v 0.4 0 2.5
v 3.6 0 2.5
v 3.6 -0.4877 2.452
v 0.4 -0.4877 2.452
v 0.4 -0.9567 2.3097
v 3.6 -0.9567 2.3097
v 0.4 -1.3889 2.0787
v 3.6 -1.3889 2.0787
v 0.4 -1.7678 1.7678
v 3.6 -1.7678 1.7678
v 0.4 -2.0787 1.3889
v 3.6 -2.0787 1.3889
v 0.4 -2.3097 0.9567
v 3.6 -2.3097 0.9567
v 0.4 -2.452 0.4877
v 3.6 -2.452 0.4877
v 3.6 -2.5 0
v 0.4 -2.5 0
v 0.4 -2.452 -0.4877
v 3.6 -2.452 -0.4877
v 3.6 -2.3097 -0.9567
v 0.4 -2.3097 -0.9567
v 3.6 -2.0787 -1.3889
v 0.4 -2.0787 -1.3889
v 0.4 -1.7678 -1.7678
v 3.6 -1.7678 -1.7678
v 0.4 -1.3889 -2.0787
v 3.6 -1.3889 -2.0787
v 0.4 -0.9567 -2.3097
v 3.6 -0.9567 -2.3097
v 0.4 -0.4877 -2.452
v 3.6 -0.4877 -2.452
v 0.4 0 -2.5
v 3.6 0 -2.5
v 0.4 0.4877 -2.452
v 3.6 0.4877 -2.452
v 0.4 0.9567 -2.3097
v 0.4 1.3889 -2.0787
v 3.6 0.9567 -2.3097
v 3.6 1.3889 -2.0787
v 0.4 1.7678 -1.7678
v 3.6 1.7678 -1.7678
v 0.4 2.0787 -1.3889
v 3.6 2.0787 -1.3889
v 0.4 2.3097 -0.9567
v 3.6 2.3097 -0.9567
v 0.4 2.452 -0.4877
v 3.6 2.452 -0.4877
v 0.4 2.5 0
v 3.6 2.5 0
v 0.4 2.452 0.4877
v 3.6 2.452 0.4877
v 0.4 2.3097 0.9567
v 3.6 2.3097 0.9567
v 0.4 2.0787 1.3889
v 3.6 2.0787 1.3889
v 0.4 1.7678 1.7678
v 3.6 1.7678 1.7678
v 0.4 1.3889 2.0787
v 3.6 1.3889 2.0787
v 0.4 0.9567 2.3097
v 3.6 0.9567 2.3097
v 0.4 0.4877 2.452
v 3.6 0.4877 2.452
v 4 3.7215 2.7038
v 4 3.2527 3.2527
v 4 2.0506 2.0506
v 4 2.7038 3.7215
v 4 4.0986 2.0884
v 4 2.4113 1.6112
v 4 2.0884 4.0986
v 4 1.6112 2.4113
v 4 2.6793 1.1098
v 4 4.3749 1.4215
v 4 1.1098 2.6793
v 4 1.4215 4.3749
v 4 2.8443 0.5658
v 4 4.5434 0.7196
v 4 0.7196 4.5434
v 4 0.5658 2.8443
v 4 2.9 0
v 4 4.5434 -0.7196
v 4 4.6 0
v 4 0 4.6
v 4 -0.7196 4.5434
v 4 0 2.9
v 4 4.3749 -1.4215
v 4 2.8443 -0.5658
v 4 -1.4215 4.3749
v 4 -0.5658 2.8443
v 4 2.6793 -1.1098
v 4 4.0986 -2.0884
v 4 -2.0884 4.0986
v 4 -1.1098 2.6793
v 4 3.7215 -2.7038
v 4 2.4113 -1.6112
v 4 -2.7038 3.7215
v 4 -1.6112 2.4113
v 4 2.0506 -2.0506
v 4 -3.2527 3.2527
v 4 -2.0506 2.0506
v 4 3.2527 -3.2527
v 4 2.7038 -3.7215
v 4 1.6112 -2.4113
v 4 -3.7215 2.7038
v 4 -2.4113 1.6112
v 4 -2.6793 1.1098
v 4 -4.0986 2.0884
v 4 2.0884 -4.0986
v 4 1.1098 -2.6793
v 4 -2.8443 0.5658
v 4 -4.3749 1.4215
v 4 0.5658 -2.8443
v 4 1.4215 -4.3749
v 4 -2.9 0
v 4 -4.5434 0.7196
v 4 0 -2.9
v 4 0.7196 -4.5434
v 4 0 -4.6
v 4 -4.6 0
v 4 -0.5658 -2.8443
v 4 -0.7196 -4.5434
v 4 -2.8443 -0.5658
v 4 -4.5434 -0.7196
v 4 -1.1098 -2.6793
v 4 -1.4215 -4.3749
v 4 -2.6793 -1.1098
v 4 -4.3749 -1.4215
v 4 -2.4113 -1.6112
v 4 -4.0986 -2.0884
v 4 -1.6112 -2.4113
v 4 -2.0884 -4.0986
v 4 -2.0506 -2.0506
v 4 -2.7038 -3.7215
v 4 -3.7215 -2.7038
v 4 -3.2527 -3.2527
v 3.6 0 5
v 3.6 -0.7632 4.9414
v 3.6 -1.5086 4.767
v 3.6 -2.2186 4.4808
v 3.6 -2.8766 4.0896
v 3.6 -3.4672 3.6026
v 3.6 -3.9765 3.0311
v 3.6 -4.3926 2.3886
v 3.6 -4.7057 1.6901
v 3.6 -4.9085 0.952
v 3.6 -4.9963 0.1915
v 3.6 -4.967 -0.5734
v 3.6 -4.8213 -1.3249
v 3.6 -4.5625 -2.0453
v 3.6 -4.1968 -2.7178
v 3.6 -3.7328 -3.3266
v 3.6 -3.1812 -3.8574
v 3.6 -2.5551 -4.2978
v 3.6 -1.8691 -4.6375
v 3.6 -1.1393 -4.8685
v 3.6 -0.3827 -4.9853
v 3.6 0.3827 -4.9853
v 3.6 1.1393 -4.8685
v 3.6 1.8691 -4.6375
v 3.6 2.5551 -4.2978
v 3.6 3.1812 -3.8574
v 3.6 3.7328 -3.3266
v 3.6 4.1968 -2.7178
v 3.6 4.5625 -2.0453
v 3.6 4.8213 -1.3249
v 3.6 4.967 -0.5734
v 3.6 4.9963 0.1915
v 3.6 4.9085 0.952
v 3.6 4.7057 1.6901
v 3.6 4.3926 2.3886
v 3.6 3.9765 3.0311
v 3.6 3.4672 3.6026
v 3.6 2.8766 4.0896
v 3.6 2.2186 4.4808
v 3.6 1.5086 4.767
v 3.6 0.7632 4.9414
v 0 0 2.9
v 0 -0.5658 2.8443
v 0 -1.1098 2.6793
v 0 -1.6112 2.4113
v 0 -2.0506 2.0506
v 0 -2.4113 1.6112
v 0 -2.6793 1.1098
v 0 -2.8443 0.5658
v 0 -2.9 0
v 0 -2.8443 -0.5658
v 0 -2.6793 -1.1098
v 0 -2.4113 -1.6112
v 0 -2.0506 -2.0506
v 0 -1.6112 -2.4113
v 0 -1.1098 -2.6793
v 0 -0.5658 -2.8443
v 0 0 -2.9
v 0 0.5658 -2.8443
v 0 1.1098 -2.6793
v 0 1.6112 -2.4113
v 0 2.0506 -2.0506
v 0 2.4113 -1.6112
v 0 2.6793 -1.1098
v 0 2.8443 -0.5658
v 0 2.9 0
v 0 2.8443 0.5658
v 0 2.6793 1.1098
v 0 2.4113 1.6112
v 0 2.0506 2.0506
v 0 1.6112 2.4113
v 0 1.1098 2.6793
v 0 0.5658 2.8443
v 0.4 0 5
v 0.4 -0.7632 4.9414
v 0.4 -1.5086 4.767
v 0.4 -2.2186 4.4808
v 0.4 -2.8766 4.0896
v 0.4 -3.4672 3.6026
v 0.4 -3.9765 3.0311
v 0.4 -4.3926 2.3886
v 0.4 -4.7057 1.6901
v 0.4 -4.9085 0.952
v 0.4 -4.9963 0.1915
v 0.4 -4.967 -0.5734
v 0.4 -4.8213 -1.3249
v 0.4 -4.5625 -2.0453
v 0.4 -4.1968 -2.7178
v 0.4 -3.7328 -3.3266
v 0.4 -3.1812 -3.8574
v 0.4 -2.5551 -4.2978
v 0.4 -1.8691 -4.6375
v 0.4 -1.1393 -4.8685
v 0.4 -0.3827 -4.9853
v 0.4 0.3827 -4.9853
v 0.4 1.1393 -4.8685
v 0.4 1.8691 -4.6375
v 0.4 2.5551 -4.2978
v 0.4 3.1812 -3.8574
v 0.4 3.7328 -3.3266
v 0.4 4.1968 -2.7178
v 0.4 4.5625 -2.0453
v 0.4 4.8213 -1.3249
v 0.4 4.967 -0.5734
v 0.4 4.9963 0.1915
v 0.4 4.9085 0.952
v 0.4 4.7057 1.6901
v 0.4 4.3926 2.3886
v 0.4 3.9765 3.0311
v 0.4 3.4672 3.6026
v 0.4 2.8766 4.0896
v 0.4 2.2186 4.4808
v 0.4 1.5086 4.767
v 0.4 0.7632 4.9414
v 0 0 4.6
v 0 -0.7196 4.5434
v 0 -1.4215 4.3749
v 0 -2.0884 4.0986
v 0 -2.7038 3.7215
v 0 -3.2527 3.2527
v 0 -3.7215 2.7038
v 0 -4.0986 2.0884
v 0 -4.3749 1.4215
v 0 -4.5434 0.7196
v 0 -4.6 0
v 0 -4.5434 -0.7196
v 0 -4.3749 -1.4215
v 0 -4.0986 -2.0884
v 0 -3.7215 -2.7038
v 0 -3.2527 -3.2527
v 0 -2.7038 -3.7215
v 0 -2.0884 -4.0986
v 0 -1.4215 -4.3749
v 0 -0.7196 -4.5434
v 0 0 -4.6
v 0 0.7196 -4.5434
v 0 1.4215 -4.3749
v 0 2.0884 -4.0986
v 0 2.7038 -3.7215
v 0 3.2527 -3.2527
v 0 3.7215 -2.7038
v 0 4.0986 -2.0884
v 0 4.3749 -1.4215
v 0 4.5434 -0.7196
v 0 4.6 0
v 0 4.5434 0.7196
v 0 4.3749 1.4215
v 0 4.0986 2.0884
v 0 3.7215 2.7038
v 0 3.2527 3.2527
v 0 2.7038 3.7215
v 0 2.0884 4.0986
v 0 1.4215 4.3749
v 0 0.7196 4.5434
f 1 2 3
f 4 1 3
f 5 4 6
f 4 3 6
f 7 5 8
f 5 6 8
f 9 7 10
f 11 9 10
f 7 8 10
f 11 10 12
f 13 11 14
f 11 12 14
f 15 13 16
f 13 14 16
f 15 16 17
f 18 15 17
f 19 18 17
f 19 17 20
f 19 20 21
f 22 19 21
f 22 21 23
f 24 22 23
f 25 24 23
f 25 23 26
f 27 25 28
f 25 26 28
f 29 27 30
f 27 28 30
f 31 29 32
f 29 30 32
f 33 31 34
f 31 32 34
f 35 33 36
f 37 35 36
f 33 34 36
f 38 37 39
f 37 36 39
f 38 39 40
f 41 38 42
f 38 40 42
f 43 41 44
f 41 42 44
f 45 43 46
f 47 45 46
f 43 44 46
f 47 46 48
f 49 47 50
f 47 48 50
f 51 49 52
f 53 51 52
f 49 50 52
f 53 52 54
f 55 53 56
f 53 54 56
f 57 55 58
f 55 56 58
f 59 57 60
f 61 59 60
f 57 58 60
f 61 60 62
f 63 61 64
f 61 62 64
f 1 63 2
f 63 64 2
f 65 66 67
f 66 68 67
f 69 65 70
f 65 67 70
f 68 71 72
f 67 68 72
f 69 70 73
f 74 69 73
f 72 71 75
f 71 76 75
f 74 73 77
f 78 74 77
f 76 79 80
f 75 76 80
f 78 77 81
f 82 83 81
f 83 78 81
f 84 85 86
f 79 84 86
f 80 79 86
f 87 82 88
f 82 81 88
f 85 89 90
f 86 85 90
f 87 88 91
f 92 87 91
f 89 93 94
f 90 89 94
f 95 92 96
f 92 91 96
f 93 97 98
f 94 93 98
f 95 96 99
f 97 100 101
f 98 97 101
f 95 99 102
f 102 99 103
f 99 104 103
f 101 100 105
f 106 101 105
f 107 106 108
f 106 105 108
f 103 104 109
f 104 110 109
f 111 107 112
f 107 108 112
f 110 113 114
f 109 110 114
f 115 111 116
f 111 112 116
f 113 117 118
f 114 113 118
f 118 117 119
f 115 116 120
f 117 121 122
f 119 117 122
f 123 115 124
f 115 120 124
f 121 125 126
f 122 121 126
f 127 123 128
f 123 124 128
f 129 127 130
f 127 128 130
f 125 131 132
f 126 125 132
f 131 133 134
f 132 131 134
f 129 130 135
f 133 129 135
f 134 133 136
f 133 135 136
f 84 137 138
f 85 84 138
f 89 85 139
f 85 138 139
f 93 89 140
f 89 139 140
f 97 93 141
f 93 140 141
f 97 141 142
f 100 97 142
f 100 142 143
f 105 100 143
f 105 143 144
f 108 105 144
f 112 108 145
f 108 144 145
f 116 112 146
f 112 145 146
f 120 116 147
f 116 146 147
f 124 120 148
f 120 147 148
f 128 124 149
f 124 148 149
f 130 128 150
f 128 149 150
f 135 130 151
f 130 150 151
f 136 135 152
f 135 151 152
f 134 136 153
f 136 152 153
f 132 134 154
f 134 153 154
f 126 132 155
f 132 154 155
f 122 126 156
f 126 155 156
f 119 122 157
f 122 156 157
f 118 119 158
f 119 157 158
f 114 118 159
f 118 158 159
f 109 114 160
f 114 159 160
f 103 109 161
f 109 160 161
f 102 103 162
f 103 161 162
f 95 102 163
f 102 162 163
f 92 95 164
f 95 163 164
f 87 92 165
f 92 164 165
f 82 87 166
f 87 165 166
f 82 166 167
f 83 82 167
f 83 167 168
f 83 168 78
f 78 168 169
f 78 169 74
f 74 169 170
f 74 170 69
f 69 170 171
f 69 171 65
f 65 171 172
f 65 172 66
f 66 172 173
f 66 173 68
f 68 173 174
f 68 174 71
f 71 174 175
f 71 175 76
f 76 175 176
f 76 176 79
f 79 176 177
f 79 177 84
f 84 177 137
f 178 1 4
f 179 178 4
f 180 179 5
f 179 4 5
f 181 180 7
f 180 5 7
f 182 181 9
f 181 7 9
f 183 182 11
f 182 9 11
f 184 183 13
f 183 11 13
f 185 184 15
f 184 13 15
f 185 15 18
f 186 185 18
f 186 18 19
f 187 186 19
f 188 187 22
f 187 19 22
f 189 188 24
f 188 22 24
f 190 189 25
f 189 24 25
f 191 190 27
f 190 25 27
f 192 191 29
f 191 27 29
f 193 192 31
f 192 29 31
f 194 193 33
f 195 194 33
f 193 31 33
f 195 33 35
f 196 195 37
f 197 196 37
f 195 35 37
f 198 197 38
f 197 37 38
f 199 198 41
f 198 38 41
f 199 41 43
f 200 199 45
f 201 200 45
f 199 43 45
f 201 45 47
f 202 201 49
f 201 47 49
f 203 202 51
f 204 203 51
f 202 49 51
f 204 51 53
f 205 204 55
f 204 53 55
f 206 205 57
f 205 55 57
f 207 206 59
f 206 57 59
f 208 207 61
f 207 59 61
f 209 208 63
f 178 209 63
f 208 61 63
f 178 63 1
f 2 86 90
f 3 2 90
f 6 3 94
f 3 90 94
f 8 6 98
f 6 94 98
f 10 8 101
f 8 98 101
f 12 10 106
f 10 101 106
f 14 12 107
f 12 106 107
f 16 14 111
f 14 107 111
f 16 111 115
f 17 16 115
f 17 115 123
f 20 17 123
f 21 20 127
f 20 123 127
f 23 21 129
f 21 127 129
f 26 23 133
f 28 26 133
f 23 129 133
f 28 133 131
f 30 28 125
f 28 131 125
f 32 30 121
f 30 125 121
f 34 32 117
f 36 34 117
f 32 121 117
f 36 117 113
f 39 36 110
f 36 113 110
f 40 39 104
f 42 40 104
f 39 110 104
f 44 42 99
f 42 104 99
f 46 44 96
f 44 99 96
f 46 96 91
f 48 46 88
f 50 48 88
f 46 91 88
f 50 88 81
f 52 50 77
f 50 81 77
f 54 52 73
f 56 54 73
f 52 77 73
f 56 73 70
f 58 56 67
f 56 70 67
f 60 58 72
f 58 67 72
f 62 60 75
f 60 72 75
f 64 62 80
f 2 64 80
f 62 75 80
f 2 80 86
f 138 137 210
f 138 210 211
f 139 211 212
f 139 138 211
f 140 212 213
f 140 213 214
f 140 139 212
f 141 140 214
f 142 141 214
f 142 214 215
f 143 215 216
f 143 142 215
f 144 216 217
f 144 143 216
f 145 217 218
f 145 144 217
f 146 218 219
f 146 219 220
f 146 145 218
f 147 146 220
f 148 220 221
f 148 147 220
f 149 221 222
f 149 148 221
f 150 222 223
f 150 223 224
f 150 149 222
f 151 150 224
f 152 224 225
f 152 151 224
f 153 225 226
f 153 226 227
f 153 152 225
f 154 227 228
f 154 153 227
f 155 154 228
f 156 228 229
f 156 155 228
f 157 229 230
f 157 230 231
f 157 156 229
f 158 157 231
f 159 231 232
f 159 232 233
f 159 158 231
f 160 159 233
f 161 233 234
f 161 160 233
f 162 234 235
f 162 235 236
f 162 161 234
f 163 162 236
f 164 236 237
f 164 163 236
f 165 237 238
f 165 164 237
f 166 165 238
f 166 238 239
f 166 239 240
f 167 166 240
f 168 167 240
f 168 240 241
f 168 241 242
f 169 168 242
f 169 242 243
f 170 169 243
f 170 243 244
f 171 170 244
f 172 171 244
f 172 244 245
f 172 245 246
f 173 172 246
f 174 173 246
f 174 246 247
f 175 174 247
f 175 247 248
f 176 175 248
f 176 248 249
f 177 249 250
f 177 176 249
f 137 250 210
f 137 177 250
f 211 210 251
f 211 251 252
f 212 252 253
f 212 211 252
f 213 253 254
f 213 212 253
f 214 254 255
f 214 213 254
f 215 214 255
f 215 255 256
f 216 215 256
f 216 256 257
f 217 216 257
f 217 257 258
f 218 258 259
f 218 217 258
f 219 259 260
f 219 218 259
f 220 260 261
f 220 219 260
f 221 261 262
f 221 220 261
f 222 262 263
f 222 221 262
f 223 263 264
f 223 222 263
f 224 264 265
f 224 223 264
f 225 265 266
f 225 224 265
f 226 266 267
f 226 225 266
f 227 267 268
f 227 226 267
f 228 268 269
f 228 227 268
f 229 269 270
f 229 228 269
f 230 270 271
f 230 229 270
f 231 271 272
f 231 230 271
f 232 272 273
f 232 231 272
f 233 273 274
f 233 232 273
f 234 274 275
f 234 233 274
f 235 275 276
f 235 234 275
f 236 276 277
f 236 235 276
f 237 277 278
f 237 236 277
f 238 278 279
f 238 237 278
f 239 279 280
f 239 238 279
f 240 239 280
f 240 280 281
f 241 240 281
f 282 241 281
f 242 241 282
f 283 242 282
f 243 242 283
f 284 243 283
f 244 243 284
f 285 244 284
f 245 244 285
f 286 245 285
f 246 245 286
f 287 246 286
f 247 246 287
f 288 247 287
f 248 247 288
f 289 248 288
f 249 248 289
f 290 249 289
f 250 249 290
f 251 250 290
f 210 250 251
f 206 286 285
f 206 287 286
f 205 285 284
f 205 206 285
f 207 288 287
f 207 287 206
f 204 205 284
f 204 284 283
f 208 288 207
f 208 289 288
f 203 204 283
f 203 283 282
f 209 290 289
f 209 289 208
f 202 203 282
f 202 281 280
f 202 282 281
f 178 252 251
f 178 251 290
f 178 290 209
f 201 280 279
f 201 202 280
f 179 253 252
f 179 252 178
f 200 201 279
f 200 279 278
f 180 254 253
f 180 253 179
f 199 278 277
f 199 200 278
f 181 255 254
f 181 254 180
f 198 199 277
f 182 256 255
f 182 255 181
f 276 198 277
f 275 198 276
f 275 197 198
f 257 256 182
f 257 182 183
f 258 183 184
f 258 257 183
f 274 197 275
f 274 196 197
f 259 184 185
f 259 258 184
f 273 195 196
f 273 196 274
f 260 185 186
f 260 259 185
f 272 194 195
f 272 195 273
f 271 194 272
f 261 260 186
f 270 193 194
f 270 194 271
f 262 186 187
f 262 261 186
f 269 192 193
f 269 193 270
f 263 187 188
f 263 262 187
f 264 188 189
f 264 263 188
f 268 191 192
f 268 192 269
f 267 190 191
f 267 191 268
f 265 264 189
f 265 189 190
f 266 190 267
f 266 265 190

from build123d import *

# Parameters (mm, degrees)
F0_W    = 4
F0_H    = 2.5
F2_SIZE = 0.4


with BuildPart() as f1:
    # F0 (on Front) → F1 (revolve)
    with BuildSketch(Plane.XZ):
        with Locations((2, 3.75)):
            Rectangle(F0_W, F0_H)
    revolve(axis=Axis((1.361359, 0, 0), (1, 0, 0)))

    # F2
    f2_edges = [f1.edges().sort_by_distance(p)[0] for p in [
        (0, 0, -2.5),
        (4, 0, -2.5),
        (2, 0, 2.5),
        (4, 0, -5),
        (0, 0, -5),
        (2, 0, 5),
    ]]
    chamfer(f2_edges, length=F2_SIZE)


solid = f1.part
